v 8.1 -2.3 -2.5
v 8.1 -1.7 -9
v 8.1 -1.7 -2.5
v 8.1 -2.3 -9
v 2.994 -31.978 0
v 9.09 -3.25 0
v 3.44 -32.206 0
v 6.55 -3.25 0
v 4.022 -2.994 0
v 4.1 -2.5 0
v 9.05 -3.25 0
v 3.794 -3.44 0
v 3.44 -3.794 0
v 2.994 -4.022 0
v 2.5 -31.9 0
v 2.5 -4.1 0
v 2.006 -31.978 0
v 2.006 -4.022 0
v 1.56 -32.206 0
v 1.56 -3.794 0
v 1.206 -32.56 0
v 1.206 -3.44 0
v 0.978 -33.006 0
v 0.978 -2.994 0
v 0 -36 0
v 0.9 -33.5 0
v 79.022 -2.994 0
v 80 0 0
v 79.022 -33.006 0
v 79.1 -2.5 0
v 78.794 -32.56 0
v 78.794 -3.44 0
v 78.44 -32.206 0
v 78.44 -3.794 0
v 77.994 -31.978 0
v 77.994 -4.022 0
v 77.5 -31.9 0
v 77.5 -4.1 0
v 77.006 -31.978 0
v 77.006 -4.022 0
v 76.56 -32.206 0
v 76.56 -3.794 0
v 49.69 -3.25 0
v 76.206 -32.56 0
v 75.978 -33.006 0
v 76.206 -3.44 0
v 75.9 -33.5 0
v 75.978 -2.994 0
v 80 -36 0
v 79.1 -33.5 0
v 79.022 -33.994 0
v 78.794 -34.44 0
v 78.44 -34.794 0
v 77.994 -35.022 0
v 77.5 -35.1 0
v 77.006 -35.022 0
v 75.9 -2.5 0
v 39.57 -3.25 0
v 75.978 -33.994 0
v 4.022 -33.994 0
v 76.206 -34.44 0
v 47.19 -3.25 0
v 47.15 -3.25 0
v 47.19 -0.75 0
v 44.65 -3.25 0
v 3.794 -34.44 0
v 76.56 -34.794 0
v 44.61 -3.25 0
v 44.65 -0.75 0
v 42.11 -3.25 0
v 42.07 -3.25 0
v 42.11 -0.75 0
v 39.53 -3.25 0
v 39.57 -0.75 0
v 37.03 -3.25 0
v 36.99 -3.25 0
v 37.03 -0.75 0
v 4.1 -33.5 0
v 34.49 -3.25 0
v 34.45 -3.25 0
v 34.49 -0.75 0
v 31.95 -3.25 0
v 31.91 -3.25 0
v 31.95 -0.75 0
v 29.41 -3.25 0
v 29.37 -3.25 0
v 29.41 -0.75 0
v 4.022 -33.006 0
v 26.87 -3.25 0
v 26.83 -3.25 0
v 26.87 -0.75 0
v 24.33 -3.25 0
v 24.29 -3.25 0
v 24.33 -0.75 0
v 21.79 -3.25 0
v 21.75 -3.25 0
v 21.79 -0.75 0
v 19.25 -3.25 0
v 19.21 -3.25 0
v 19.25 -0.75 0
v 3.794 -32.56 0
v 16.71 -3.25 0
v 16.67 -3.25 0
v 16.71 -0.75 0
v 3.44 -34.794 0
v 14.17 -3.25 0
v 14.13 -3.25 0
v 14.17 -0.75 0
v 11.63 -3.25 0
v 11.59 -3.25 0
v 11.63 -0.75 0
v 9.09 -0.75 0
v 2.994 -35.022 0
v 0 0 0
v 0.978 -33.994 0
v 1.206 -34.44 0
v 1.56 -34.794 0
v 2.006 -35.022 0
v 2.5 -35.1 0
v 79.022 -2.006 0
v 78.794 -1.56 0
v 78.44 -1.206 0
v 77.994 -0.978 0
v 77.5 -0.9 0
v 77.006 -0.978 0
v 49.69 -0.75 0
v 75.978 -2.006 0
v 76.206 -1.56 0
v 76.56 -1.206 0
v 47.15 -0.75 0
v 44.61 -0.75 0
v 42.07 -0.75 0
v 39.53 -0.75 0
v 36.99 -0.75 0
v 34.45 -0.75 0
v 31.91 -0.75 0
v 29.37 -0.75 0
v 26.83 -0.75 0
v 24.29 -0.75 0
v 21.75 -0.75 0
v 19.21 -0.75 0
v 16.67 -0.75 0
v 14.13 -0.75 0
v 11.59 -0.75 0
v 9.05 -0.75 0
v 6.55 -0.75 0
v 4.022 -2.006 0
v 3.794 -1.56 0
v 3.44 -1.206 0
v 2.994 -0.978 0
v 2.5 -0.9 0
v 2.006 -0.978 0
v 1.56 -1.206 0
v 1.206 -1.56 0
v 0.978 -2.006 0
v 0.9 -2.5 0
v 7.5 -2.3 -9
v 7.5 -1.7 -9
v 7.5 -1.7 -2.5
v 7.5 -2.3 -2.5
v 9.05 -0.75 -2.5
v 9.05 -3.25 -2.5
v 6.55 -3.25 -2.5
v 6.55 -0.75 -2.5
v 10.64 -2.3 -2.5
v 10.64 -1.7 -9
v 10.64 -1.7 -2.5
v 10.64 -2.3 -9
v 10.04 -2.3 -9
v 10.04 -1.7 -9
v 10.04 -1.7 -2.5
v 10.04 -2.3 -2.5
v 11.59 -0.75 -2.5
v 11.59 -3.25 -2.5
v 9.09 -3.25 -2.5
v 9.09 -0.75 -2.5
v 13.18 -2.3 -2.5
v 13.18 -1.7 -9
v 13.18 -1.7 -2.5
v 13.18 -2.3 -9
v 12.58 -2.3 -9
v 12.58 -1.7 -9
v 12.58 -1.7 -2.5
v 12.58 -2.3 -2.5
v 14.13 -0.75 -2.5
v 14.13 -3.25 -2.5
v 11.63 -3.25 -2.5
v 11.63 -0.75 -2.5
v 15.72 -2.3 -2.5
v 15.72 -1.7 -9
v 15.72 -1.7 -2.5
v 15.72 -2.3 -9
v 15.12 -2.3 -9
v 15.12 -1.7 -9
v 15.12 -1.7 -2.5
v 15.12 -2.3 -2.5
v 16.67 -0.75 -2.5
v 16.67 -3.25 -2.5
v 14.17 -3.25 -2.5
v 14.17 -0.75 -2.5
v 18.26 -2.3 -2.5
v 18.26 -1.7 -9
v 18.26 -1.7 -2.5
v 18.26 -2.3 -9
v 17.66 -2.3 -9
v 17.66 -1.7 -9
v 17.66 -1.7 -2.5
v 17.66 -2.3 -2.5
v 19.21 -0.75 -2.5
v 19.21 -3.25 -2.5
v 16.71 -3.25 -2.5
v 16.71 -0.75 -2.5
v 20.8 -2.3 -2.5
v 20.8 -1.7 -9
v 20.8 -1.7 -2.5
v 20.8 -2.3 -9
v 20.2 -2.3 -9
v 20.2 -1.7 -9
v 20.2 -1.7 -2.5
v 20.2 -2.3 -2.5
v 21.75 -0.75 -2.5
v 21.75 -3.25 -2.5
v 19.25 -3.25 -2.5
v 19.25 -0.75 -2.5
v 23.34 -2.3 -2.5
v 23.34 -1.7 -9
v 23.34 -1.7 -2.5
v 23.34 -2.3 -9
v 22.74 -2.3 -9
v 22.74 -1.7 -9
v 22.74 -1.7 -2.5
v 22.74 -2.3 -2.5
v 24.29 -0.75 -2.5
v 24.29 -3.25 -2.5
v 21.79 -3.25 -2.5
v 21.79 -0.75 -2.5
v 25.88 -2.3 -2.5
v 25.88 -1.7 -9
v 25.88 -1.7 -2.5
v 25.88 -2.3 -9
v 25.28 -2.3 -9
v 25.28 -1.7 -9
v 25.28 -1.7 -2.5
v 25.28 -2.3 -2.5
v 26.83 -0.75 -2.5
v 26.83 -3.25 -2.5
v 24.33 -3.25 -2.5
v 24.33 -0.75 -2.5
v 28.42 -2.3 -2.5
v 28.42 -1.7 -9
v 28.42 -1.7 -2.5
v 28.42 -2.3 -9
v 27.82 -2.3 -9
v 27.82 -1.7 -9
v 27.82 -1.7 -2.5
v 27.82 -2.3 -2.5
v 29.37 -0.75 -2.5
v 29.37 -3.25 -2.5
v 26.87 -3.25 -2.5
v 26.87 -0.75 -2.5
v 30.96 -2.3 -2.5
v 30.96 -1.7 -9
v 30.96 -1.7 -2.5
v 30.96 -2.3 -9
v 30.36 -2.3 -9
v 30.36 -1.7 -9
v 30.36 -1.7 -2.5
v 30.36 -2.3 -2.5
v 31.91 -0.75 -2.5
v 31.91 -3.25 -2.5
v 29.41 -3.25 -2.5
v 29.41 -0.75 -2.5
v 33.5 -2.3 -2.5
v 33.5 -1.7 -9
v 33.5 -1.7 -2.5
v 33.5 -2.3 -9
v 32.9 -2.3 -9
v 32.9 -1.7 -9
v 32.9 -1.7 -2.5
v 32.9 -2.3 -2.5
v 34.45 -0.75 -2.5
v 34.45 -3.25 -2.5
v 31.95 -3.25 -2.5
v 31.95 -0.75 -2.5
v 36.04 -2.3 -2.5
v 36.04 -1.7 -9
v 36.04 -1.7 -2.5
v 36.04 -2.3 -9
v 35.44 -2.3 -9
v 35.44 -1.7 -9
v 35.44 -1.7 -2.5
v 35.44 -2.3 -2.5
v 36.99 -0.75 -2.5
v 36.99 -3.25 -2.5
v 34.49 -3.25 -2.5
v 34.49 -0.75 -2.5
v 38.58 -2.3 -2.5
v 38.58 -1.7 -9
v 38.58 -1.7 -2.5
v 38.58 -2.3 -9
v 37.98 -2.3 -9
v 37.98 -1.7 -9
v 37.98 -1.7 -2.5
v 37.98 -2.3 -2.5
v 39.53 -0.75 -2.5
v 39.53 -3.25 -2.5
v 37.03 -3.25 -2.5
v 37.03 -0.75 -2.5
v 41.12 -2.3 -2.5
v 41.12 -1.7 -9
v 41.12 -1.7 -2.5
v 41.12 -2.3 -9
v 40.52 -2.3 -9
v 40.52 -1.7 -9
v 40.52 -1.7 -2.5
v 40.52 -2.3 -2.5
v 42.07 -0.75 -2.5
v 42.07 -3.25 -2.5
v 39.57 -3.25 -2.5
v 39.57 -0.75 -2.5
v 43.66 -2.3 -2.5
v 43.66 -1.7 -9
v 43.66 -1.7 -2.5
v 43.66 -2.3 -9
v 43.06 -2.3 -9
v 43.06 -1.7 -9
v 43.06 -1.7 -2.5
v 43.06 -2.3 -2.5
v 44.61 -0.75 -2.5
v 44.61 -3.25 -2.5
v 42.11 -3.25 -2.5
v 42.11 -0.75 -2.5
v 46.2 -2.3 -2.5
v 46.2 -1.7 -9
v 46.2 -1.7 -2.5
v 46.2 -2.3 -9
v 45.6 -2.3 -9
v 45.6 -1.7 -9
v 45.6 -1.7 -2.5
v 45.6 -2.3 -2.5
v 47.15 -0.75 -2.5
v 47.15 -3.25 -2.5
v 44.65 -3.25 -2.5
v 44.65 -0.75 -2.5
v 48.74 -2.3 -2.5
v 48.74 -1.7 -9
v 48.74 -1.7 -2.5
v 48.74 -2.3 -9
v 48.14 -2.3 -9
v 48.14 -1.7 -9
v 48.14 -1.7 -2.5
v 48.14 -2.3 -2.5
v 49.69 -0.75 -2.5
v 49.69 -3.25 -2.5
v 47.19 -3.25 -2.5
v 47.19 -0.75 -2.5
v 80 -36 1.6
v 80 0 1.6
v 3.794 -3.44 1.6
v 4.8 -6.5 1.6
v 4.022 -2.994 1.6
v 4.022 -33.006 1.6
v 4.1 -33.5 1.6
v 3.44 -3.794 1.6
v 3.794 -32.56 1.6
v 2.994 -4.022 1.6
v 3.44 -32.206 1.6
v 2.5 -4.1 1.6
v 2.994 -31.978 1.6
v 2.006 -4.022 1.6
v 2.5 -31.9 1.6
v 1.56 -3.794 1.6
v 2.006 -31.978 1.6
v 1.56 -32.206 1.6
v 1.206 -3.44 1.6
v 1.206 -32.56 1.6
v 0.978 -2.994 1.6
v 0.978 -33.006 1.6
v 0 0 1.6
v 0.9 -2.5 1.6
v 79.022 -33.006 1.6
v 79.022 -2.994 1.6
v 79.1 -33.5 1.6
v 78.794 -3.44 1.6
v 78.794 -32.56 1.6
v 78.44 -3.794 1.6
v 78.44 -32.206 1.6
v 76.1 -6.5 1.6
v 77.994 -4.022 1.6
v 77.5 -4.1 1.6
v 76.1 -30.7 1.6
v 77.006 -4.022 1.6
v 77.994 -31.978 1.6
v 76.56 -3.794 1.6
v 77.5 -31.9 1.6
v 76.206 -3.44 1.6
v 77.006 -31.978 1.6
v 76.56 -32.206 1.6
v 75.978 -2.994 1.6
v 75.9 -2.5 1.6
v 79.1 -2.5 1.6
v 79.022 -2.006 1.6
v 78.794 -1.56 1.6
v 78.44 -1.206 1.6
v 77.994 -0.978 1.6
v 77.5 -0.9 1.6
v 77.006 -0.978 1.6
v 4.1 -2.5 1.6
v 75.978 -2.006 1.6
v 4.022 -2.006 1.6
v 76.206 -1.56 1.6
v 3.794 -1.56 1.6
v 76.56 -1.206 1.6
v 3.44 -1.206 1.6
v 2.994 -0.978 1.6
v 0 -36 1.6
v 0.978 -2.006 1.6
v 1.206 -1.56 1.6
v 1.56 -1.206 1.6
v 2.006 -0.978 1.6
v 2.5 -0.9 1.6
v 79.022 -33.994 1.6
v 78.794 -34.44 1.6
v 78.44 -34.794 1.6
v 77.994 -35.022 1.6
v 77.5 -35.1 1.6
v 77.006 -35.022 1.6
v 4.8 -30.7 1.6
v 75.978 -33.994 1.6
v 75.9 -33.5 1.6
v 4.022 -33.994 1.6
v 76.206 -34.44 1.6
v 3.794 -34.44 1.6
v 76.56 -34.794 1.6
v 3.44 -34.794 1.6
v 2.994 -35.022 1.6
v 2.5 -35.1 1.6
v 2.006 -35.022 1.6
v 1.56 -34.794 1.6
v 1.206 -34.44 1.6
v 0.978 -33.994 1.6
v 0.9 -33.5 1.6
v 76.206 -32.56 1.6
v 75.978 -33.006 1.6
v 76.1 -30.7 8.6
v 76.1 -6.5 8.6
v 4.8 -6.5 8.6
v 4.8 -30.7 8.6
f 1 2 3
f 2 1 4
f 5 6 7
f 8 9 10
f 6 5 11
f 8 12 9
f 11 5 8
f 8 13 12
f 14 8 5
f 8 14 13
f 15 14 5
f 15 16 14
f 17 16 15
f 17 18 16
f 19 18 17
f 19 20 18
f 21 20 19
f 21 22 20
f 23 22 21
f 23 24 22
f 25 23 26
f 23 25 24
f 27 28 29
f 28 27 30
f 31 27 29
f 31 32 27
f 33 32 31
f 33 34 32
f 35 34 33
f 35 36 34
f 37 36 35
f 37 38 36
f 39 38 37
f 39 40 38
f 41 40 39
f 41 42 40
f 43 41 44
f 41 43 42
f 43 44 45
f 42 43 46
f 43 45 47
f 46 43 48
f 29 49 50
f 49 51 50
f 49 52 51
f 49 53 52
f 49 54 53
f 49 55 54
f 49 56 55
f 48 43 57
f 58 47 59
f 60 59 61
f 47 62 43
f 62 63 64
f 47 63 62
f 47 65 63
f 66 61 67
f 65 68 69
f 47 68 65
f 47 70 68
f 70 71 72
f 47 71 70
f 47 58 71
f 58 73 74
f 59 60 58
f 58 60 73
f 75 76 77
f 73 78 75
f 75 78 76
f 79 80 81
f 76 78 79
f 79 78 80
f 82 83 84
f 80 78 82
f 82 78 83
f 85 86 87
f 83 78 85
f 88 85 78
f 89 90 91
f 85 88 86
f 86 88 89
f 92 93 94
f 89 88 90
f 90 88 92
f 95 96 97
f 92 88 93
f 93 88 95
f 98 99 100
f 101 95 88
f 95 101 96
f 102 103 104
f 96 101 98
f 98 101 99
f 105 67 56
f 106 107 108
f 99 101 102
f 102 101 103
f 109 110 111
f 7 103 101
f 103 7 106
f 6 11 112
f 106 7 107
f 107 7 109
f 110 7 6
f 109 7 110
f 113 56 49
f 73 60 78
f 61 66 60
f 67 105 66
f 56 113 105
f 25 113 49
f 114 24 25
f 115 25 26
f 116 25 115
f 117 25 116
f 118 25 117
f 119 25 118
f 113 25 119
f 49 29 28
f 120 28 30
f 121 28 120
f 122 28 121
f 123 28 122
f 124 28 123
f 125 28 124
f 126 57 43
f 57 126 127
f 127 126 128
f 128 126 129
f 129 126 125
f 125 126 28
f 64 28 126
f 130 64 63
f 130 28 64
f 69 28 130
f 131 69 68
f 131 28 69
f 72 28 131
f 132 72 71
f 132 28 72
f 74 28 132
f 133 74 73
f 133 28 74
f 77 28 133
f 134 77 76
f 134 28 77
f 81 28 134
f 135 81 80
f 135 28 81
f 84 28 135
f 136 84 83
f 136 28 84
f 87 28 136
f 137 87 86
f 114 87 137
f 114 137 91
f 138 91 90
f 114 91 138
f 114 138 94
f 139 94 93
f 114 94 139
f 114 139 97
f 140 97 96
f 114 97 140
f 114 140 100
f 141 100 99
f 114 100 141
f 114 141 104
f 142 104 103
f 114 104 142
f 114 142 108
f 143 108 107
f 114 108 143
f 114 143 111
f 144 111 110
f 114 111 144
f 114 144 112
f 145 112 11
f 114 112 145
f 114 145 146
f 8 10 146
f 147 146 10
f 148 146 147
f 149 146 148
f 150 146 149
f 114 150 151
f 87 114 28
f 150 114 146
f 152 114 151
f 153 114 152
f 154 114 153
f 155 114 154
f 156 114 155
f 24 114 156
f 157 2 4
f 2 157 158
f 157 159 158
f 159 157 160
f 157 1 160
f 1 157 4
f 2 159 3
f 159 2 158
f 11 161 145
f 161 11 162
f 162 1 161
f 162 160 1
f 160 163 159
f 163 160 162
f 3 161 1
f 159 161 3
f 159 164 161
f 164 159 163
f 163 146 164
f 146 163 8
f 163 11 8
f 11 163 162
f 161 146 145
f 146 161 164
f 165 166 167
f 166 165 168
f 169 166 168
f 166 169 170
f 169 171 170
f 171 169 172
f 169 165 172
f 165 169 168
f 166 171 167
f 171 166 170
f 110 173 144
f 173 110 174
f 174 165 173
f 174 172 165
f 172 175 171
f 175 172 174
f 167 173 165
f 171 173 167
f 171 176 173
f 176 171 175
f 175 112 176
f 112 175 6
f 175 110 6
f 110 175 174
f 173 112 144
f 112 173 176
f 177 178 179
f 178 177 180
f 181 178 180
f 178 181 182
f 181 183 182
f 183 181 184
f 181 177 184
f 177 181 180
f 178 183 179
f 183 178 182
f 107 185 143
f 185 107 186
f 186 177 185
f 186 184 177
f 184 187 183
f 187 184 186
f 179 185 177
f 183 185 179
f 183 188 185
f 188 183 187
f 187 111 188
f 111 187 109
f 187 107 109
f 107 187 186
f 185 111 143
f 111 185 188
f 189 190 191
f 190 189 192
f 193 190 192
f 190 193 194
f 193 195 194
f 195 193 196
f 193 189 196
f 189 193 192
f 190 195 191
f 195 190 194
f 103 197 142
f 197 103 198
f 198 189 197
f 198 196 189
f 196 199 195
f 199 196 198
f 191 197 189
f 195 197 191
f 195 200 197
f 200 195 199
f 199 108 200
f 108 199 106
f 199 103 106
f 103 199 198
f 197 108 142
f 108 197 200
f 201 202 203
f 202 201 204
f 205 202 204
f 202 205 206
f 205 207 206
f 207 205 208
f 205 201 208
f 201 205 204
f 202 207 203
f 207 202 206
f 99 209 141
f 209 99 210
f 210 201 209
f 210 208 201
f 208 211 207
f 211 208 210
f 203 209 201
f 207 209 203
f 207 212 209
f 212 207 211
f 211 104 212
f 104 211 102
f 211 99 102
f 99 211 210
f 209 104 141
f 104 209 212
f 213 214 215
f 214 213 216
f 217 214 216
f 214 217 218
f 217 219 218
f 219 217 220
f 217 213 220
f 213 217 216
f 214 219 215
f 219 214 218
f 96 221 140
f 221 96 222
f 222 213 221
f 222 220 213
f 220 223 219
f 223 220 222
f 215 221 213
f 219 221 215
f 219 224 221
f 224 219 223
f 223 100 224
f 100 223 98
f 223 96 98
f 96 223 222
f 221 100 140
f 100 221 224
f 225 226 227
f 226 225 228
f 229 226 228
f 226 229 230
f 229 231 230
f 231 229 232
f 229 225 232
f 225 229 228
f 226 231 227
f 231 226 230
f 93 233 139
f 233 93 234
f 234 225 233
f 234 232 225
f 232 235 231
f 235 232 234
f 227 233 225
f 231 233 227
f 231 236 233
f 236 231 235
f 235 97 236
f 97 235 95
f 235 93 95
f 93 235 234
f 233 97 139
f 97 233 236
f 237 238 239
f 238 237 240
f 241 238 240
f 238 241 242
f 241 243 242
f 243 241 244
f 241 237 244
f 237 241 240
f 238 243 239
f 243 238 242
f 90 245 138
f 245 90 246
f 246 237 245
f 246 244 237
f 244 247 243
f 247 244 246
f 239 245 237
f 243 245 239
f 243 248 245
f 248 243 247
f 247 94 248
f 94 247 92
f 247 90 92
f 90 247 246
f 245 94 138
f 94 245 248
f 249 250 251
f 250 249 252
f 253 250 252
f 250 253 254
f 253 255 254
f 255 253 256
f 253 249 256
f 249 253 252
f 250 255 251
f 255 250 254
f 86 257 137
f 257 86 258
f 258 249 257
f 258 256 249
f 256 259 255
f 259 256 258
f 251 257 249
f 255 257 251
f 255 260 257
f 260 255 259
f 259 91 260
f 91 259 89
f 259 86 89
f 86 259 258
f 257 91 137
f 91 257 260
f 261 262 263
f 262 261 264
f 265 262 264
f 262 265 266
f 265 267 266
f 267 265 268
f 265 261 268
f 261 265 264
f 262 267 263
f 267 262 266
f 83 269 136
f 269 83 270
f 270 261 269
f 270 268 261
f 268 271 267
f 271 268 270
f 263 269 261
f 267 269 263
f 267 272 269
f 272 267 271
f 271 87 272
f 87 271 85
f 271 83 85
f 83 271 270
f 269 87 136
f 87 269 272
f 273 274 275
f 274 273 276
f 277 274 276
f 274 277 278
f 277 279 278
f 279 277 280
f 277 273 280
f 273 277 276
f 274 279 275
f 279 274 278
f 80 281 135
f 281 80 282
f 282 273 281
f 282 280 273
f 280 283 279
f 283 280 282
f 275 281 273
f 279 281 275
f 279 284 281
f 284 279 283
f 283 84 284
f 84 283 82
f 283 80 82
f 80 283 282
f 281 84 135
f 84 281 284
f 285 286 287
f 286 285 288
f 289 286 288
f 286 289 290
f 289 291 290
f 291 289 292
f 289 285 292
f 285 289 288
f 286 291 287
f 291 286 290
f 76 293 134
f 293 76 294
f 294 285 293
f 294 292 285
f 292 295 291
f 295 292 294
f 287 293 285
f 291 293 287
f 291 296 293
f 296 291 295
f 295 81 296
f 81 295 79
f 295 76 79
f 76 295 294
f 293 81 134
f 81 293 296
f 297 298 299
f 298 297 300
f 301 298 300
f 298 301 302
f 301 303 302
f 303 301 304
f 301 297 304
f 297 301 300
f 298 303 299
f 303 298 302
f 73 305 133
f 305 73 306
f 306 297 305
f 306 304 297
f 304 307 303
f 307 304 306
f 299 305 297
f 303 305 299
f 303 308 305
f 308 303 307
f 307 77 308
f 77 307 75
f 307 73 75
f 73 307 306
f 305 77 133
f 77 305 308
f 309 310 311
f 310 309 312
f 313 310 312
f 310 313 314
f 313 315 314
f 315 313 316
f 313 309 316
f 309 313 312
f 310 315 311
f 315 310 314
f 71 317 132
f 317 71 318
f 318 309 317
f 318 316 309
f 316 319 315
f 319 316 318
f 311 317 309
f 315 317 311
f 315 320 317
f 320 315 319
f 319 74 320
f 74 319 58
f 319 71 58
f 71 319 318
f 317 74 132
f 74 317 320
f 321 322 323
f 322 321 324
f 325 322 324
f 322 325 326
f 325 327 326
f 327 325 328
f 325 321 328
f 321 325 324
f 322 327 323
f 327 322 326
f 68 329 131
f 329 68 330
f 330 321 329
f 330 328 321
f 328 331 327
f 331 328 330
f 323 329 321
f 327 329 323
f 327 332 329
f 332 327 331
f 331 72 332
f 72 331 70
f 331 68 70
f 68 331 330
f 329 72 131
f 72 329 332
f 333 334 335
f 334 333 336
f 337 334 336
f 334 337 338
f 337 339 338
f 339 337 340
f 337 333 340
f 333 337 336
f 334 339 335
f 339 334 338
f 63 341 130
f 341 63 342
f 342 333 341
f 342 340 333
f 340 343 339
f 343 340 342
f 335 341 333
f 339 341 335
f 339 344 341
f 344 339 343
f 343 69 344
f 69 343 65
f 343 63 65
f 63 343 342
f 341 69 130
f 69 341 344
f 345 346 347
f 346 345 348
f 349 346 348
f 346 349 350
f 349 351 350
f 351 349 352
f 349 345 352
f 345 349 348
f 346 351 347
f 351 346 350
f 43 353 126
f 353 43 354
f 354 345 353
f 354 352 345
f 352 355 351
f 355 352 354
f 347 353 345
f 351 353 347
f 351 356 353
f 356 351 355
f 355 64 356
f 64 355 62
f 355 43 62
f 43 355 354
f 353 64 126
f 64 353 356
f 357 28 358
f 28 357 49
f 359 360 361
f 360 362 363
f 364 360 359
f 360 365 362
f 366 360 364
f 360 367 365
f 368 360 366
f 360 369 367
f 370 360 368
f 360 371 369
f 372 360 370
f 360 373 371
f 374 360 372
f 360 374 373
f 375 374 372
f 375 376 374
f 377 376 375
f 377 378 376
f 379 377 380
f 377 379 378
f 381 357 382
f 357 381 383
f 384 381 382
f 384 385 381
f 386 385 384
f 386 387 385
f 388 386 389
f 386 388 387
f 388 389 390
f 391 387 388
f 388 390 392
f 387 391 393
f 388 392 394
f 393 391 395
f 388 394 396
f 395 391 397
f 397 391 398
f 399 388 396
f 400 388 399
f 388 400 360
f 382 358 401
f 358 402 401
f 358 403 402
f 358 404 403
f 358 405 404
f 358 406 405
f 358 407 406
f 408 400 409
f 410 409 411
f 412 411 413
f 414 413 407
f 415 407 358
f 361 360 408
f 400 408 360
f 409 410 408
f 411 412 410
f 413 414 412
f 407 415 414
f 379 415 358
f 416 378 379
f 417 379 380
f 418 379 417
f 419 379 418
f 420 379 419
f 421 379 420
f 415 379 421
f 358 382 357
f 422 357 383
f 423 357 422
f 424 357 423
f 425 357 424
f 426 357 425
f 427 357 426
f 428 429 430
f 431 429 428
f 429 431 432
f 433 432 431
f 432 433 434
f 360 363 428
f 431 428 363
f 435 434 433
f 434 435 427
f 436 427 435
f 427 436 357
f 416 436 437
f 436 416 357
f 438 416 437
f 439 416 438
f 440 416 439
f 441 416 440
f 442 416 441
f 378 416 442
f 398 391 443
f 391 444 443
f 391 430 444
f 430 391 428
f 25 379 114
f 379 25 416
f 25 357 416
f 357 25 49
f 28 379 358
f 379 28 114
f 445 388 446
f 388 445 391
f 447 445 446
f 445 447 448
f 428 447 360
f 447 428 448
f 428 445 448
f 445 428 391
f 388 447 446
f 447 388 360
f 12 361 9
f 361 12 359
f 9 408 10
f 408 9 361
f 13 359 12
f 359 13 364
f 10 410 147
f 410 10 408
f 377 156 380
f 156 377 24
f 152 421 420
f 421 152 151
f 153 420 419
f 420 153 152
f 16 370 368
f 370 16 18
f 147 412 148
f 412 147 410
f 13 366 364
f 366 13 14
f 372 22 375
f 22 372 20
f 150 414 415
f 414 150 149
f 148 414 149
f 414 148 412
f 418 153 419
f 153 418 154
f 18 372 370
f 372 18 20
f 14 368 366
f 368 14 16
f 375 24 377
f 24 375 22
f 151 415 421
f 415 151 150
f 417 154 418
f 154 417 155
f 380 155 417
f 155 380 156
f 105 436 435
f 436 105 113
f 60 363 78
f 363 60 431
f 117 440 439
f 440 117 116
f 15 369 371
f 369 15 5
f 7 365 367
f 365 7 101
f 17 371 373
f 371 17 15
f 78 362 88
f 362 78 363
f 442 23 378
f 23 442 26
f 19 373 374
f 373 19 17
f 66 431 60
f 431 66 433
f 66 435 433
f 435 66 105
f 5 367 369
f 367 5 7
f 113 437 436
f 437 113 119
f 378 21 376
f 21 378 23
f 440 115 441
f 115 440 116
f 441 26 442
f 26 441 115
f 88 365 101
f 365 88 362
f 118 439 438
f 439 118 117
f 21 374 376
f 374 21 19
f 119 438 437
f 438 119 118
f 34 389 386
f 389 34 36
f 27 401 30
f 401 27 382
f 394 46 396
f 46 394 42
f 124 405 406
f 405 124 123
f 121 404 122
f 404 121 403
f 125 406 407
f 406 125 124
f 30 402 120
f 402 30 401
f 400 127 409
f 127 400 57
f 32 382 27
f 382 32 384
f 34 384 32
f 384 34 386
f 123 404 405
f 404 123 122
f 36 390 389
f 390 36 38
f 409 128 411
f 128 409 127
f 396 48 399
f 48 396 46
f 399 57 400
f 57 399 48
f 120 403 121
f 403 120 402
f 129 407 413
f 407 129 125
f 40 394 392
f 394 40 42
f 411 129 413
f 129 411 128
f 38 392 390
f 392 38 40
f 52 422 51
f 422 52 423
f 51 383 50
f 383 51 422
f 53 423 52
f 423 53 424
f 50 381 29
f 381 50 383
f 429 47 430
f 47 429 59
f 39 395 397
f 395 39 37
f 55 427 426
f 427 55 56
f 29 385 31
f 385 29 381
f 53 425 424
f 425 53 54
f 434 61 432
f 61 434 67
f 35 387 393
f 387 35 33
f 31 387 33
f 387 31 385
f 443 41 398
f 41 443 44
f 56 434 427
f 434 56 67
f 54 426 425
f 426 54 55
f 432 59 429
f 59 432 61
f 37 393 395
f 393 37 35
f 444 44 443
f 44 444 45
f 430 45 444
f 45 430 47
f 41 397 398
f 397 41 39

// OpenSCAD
fn = 20;

mirror([0,1,0])
{
    difference()
    {
        union()
        {
            cube([80, 36, 1.6]);
            translate([4.8,6.5,1.6])
                cube([71.3, 24.2, 7]);
            
            translate([7.8, 2, -9])
            {
                for(x = [0 : 0.1 : 1.6])
                {
                    translate([x * 25.4, 0, 0])
                    {
                        translate([-0.3, -0.3, 0])
                            cube([0.6, 0.6, 9]);
                        
                        translate([-1.25, -1.25, 6.5])
                            cube([2.5, 2.5, 2.5]);
                    }
                }
            }
        }
        
        translate([2.5, 2.5, 0])
            cylinder(d = 3.2, 1.6, $fn = fn);
        translate([2.5, 33.5, 0])
            cylinder(d = 3.2, 1.6, $fn = fn);
        translate([77.5, 2.5, 0])
            cylinder(d = 3.2, 1.6, $fn = fn);
        translate([77.5, 33.5, 0])
            cylinder(d = 3.2, 1.6, $fn = fn);
    }
}
